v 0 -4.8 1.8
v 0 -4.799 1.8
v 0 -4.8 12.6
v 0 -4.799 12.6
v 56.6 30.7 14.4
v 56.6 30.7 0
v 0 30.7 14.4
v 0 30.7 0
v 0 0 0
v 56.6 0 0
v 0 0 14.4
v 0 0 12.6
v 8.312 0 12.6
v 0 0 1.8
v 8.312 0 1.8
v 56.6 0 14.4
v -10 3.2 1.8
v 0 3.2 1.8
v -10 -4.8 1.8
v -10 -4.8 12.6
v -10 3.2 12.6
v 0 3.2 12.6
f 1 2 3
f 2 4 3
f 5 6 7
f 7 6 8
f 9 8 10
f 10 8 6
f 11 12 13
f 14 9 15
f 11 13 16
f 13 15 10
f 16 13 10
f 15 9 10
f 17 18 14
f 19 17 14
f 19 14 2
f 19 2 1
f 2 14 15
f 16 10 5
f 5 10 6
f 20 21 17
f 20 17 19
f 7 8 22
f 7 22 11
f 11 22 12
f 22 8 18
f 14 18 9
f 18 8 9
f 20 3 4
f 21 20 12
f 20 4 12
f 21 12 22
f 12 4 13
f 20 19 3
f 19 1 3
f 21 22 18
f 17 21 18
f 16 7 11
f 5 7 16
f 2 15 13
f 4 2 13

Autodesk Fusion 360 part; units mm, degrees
sketch "Sketch1" plane through (0, 0, 0) normal (0, 0, 1) x (1, 0, 0)
  line L0 (0, 0) -> (56.6, 0)
  line L1 (56.6, 0) -> (56.6, 30.7)
  line L2 (56.6, 30.7) -> (0, 30.7)
  line L3 (0, 30.7) -> (0, 0)
  dimension "d1" = 56.6
  dimension "d2" = 30.7
extrude "Extrude1" add sketch "Sketch1" along normal blind 14.4
sketch "Sketch2" plane through (0, 0, 0) normal (-1, 0, 0) x (0, -1, 0)
  line L0 (-30.7, 0) -> (0, 0)
  line L1 (0, 14.4) -> (-30.7, 14.4)
  line L2 (-30.7, 14.4) -> (-30.7, 0)
  line L3 (4.8, 12.6) -> (-3.2, 12.6)
  line L4 (-3.2, 12.6) -> (-3.2, 1.8)
  line L5 (-3.2, 1.8) -> (4.8, 1.8)
  line L6 (4.8, 1.8) -> (4.8, 12.6)
  line L7 (0, 0) -> (0, 14.4)
  dimension "d9" = 8
  dimension "d10" = 3.2
  dimension "d11" = 1.8
  dimension "d12" = 1.8
extrude "Extrude2" add sketch "Sketch2" along normal blind 10 contours L3 L5 L6 L7 | L3 L4 L5 L7
chamfer "Chamfer1" distance 4.8 angle 60 1 edges at (0, 0, 7.2) measured on face at (0, -1.6, 5.4)
equation "d12 = d11"
